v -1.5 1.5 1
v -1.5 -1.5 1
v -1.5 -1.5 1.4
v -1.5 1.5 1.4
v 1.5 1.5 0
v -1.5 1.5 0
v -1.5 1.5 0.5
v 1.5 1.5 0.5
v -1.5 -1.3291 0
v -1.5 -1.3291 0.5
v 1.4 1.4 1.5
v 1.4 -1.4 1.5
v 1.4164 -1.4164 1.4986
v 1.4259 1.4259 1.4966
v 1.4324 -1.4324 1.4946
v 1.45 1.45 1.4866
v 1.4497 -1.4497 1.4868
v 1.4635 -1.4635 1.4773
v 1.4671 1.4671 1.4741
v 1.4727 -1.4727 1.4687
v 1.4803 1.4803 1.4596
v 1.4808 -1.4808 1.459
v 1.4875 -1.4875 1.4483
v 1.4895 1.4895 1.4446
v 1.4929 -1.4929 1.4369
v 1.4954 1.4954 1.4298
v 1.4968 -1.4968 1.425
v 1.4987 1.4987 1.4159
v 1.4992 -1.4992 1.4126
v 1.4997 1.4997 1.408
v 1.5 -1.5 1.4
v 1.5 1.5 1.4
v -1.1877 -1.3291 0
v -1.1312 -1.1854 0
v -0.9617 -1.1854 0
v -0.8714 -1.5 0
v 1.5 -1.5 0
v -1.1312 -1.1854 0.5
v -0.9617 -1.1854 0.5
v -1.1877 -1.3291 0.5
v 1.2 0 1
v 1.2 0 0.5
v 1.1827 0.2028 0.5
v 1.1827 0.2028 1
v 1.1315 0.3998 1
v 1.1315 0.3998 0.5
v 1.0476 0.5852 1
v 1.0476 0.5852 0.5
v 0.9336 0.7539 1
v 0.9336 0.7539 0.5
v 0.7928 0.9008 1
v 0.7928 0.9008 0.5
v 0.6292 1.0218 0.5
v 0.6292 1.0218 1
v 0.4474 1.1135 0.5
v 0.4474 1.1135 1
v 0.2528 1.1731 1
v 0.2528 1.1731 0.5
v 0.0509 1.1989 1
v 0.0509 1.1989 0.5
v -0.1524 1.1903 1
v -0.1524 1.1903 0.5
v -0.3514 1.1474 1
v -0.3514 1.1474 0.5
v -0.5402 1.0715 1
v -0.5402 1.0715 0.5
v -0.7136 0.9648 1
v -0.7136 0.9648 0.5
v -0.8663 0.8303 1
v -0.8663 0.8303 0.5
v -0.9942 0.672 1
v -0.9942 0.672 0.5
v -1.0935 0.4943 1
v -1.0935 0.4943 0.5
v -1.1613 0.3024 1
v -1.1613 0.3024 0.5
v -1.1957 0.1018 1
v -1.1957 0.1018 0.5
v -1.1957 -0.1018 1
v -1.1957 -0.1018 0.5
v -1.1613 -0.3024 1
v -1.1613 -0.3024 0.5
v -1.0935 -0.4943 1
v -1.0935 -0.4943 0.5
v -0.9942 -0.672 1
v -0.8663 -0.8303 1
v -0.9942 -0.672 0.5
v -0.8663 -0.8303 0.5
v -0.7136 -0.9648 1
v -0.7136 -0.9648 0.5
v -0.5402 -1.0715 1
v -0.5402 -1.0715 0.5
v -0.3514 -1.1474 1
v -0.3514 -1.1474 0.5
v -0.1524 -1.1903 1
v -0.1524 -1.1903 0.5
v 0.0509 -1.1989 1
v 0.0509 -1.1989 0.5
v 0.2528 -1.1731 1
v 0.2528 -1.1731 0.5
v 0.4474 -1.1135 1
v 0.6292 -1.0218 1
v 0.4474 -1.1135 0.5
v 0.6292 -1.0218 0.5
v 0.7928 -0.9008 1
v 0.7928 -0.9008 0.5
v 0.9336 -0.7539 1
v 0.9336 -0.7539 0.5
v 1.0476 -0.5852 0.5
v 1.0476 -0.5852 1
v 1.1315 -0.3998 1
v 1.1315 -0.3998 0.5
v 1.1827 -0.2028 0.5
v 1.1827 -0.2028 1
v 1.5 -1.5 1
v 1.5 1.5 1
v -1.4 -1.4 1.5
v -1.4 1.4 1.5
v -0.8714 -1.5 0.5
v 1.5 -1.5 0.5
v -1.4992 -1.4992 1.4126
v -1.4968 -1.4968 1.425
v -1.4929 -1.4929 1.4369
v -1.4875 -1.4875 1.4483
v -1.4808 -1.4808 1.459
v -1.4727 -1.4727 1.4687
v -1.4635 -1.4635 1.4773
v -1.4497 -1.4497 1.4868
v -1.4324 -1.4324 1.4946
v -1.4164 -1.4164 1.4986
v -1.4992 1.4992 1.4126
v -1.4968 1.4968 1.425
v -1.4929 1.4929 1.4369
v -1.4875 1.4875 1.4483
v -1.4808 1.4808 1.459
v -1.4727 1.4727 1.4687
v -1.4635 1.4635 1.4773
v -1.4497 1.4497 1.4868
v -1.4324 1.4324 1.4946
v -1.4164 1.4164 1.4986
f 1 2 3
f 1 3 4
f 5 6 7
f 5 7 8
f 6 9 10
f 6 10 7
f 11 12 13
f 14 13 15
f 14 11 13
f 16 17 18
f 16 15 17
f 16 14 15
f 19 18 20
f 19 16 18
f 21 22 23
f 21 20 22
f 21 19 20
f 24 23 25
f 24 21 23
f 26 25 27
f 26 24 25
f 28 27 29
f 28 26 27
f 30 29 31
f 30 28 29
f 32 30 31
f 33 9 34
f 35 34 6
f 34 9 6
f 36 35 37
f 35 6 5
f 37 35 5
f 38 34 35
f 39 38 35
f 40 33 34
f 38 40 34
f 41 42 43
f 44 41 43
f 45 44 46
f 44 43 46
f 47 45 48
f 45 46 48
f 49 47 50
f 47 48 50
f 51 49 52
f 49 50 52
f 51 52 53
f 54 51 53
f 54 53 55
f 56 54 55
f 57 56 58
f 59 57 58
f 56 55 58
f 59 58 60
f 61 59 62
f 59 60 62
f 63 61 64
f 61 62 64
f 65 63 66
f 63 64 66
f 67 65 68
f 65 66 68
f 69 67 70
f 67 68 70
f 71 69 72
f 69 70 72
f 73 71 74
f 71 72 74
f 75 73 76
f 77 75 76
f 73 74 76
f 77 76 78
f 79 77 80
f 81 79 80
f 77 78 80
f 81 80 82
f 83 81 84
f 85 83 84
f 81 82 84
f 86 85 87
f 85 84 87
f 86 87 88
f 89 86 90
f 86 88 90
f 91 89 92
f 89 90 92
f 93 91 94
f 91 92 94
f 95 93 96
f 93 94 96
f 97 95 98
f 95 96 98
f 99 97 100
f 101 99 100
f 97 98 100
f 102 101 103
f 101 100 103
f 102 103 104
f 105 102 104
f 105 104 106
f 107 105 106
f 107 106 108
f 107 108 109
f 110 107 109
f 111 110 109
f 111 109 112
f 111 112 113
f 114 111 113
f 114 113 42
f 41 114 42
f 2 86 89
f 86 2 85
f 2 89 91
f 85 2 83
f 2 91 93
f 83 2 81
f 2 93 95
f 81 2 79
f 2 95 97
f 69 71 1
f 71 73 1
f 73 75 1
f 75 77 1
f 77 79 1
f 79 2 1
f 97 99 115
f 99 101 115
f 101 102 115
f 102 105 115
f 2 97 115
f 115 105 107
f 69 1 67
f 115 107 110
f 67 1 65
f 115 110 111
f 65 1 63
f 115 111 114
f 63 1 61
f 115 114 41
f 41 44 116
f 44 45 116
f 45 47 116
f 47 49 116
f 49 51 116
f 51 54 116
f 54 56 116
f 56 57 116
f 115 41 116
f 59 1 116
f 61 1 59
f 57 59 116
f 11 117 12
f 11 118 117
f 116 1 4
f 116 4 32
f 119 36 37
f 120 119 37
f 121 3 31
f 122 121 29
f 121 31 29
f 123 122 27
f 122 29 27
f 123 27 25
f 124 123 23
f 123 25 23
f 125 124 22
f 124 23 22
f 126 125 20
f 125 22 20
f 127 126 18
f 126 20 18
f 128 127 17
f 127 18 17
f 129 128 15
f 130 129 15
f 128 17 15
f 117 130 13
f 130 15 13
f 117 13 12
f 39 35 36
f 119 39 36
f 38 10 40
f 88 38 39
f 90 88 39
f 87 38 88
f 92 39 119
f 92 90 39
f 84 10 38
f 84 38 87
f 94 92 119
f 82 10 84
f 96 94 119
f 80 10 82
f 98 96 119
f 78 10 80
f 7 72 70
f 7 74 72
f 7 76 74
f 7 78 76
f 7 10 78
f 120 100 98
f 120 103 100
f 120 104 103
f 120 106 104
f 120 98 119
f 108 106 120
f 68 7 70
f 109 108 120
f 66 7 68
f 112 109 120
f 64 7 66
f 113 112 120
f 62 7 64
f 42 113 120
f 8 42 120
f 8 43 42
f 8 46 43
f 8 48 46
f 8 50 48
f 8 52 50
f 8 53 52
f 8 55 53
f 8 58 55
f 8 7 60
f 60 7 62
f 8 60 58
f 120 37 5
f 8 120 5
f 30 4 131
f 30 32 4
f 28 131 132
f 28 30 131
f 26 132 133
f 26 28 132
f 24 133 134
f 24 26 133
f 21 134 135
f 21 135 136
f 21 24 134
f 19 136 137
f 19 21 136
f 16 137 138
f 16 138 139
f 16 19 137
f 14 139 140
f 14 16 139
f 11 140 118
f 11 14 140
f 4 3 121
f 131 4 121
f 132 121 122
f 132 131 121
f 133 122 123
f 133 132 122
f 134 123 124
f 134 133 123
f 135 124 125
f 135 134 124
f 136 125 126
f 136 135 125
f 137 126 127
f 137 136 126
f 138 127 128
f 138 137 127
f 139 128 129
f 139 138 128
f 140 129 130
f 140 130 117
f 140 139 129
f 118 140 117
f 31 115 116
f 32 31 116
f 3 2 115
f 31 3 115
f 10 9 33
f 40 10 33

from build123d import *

# Parameters (mm, degrees)
SKETCH_W     = 3
SKETCH_H     = 3
PAD_DEPTH    = 0.5
SKETCH001_R  = 1.2
PAD001_DEPTH = 0.5
SKETCH002_W  = 3
SKETCH002_H  = 3
PAD002_DEPTH = 0.5
FILLET_R     = 0.1
POCKET_DEPTH = 0.5


with BuildPart() as part:
    # Sketch → Pad (new body)
    with BuildSketch(Plane.XY):
        Rectangle(SKETCH_W, SKETCH_H)
    extrude(amount=PAD_DEPTH)

    # Sketch001 (on Face6 of Pad) → Pad001 (join)
    with BuildSketch(Plane.XY.offset(0.5)):
        Circle(SKETCH001_R)
    extrude(amount=PAD001_DEPTH)

    # Sketch002 (on Face8 of Pad001) → Pad002 (join)
    with BuildSketch(Plane.XY.offset(1)):
        Rectangle(SKETCH002_W, SKETCH002_H)
    extrude(amount=PAD002_DEPTH)

    # Fillet
    fillet_edges = [part.edges().sort_by_distance(p)[0] for p in [
        (0, -1.5, 1.5),
        (1.5, 0, 1.5),
        (0, 1.5, 1.5),
        (-1.5, 0, 1.5),
    ]]
    fillet(fillet_edges, radius=FILLET_R)

    # Sketch003 (on Face17 of Fillet) → Pocket (cut)
    with BuildSketch(Plane(origin=(0, 0, 0), x_dir=(1, 0, 0), z_dir=(0, 0, -1))):
        Polygon((-1.5, 1.5), (-1.5, 1.329069), (-1.187675, 1.329069), (-1.131193, 1.185444), (-0.961748, 1.185444), (-0.871377, 1.5), align=None)
    extrude(amount=-POCKET_DEPTH, mode=Mode.SUBTRACT)


solid = part.part
